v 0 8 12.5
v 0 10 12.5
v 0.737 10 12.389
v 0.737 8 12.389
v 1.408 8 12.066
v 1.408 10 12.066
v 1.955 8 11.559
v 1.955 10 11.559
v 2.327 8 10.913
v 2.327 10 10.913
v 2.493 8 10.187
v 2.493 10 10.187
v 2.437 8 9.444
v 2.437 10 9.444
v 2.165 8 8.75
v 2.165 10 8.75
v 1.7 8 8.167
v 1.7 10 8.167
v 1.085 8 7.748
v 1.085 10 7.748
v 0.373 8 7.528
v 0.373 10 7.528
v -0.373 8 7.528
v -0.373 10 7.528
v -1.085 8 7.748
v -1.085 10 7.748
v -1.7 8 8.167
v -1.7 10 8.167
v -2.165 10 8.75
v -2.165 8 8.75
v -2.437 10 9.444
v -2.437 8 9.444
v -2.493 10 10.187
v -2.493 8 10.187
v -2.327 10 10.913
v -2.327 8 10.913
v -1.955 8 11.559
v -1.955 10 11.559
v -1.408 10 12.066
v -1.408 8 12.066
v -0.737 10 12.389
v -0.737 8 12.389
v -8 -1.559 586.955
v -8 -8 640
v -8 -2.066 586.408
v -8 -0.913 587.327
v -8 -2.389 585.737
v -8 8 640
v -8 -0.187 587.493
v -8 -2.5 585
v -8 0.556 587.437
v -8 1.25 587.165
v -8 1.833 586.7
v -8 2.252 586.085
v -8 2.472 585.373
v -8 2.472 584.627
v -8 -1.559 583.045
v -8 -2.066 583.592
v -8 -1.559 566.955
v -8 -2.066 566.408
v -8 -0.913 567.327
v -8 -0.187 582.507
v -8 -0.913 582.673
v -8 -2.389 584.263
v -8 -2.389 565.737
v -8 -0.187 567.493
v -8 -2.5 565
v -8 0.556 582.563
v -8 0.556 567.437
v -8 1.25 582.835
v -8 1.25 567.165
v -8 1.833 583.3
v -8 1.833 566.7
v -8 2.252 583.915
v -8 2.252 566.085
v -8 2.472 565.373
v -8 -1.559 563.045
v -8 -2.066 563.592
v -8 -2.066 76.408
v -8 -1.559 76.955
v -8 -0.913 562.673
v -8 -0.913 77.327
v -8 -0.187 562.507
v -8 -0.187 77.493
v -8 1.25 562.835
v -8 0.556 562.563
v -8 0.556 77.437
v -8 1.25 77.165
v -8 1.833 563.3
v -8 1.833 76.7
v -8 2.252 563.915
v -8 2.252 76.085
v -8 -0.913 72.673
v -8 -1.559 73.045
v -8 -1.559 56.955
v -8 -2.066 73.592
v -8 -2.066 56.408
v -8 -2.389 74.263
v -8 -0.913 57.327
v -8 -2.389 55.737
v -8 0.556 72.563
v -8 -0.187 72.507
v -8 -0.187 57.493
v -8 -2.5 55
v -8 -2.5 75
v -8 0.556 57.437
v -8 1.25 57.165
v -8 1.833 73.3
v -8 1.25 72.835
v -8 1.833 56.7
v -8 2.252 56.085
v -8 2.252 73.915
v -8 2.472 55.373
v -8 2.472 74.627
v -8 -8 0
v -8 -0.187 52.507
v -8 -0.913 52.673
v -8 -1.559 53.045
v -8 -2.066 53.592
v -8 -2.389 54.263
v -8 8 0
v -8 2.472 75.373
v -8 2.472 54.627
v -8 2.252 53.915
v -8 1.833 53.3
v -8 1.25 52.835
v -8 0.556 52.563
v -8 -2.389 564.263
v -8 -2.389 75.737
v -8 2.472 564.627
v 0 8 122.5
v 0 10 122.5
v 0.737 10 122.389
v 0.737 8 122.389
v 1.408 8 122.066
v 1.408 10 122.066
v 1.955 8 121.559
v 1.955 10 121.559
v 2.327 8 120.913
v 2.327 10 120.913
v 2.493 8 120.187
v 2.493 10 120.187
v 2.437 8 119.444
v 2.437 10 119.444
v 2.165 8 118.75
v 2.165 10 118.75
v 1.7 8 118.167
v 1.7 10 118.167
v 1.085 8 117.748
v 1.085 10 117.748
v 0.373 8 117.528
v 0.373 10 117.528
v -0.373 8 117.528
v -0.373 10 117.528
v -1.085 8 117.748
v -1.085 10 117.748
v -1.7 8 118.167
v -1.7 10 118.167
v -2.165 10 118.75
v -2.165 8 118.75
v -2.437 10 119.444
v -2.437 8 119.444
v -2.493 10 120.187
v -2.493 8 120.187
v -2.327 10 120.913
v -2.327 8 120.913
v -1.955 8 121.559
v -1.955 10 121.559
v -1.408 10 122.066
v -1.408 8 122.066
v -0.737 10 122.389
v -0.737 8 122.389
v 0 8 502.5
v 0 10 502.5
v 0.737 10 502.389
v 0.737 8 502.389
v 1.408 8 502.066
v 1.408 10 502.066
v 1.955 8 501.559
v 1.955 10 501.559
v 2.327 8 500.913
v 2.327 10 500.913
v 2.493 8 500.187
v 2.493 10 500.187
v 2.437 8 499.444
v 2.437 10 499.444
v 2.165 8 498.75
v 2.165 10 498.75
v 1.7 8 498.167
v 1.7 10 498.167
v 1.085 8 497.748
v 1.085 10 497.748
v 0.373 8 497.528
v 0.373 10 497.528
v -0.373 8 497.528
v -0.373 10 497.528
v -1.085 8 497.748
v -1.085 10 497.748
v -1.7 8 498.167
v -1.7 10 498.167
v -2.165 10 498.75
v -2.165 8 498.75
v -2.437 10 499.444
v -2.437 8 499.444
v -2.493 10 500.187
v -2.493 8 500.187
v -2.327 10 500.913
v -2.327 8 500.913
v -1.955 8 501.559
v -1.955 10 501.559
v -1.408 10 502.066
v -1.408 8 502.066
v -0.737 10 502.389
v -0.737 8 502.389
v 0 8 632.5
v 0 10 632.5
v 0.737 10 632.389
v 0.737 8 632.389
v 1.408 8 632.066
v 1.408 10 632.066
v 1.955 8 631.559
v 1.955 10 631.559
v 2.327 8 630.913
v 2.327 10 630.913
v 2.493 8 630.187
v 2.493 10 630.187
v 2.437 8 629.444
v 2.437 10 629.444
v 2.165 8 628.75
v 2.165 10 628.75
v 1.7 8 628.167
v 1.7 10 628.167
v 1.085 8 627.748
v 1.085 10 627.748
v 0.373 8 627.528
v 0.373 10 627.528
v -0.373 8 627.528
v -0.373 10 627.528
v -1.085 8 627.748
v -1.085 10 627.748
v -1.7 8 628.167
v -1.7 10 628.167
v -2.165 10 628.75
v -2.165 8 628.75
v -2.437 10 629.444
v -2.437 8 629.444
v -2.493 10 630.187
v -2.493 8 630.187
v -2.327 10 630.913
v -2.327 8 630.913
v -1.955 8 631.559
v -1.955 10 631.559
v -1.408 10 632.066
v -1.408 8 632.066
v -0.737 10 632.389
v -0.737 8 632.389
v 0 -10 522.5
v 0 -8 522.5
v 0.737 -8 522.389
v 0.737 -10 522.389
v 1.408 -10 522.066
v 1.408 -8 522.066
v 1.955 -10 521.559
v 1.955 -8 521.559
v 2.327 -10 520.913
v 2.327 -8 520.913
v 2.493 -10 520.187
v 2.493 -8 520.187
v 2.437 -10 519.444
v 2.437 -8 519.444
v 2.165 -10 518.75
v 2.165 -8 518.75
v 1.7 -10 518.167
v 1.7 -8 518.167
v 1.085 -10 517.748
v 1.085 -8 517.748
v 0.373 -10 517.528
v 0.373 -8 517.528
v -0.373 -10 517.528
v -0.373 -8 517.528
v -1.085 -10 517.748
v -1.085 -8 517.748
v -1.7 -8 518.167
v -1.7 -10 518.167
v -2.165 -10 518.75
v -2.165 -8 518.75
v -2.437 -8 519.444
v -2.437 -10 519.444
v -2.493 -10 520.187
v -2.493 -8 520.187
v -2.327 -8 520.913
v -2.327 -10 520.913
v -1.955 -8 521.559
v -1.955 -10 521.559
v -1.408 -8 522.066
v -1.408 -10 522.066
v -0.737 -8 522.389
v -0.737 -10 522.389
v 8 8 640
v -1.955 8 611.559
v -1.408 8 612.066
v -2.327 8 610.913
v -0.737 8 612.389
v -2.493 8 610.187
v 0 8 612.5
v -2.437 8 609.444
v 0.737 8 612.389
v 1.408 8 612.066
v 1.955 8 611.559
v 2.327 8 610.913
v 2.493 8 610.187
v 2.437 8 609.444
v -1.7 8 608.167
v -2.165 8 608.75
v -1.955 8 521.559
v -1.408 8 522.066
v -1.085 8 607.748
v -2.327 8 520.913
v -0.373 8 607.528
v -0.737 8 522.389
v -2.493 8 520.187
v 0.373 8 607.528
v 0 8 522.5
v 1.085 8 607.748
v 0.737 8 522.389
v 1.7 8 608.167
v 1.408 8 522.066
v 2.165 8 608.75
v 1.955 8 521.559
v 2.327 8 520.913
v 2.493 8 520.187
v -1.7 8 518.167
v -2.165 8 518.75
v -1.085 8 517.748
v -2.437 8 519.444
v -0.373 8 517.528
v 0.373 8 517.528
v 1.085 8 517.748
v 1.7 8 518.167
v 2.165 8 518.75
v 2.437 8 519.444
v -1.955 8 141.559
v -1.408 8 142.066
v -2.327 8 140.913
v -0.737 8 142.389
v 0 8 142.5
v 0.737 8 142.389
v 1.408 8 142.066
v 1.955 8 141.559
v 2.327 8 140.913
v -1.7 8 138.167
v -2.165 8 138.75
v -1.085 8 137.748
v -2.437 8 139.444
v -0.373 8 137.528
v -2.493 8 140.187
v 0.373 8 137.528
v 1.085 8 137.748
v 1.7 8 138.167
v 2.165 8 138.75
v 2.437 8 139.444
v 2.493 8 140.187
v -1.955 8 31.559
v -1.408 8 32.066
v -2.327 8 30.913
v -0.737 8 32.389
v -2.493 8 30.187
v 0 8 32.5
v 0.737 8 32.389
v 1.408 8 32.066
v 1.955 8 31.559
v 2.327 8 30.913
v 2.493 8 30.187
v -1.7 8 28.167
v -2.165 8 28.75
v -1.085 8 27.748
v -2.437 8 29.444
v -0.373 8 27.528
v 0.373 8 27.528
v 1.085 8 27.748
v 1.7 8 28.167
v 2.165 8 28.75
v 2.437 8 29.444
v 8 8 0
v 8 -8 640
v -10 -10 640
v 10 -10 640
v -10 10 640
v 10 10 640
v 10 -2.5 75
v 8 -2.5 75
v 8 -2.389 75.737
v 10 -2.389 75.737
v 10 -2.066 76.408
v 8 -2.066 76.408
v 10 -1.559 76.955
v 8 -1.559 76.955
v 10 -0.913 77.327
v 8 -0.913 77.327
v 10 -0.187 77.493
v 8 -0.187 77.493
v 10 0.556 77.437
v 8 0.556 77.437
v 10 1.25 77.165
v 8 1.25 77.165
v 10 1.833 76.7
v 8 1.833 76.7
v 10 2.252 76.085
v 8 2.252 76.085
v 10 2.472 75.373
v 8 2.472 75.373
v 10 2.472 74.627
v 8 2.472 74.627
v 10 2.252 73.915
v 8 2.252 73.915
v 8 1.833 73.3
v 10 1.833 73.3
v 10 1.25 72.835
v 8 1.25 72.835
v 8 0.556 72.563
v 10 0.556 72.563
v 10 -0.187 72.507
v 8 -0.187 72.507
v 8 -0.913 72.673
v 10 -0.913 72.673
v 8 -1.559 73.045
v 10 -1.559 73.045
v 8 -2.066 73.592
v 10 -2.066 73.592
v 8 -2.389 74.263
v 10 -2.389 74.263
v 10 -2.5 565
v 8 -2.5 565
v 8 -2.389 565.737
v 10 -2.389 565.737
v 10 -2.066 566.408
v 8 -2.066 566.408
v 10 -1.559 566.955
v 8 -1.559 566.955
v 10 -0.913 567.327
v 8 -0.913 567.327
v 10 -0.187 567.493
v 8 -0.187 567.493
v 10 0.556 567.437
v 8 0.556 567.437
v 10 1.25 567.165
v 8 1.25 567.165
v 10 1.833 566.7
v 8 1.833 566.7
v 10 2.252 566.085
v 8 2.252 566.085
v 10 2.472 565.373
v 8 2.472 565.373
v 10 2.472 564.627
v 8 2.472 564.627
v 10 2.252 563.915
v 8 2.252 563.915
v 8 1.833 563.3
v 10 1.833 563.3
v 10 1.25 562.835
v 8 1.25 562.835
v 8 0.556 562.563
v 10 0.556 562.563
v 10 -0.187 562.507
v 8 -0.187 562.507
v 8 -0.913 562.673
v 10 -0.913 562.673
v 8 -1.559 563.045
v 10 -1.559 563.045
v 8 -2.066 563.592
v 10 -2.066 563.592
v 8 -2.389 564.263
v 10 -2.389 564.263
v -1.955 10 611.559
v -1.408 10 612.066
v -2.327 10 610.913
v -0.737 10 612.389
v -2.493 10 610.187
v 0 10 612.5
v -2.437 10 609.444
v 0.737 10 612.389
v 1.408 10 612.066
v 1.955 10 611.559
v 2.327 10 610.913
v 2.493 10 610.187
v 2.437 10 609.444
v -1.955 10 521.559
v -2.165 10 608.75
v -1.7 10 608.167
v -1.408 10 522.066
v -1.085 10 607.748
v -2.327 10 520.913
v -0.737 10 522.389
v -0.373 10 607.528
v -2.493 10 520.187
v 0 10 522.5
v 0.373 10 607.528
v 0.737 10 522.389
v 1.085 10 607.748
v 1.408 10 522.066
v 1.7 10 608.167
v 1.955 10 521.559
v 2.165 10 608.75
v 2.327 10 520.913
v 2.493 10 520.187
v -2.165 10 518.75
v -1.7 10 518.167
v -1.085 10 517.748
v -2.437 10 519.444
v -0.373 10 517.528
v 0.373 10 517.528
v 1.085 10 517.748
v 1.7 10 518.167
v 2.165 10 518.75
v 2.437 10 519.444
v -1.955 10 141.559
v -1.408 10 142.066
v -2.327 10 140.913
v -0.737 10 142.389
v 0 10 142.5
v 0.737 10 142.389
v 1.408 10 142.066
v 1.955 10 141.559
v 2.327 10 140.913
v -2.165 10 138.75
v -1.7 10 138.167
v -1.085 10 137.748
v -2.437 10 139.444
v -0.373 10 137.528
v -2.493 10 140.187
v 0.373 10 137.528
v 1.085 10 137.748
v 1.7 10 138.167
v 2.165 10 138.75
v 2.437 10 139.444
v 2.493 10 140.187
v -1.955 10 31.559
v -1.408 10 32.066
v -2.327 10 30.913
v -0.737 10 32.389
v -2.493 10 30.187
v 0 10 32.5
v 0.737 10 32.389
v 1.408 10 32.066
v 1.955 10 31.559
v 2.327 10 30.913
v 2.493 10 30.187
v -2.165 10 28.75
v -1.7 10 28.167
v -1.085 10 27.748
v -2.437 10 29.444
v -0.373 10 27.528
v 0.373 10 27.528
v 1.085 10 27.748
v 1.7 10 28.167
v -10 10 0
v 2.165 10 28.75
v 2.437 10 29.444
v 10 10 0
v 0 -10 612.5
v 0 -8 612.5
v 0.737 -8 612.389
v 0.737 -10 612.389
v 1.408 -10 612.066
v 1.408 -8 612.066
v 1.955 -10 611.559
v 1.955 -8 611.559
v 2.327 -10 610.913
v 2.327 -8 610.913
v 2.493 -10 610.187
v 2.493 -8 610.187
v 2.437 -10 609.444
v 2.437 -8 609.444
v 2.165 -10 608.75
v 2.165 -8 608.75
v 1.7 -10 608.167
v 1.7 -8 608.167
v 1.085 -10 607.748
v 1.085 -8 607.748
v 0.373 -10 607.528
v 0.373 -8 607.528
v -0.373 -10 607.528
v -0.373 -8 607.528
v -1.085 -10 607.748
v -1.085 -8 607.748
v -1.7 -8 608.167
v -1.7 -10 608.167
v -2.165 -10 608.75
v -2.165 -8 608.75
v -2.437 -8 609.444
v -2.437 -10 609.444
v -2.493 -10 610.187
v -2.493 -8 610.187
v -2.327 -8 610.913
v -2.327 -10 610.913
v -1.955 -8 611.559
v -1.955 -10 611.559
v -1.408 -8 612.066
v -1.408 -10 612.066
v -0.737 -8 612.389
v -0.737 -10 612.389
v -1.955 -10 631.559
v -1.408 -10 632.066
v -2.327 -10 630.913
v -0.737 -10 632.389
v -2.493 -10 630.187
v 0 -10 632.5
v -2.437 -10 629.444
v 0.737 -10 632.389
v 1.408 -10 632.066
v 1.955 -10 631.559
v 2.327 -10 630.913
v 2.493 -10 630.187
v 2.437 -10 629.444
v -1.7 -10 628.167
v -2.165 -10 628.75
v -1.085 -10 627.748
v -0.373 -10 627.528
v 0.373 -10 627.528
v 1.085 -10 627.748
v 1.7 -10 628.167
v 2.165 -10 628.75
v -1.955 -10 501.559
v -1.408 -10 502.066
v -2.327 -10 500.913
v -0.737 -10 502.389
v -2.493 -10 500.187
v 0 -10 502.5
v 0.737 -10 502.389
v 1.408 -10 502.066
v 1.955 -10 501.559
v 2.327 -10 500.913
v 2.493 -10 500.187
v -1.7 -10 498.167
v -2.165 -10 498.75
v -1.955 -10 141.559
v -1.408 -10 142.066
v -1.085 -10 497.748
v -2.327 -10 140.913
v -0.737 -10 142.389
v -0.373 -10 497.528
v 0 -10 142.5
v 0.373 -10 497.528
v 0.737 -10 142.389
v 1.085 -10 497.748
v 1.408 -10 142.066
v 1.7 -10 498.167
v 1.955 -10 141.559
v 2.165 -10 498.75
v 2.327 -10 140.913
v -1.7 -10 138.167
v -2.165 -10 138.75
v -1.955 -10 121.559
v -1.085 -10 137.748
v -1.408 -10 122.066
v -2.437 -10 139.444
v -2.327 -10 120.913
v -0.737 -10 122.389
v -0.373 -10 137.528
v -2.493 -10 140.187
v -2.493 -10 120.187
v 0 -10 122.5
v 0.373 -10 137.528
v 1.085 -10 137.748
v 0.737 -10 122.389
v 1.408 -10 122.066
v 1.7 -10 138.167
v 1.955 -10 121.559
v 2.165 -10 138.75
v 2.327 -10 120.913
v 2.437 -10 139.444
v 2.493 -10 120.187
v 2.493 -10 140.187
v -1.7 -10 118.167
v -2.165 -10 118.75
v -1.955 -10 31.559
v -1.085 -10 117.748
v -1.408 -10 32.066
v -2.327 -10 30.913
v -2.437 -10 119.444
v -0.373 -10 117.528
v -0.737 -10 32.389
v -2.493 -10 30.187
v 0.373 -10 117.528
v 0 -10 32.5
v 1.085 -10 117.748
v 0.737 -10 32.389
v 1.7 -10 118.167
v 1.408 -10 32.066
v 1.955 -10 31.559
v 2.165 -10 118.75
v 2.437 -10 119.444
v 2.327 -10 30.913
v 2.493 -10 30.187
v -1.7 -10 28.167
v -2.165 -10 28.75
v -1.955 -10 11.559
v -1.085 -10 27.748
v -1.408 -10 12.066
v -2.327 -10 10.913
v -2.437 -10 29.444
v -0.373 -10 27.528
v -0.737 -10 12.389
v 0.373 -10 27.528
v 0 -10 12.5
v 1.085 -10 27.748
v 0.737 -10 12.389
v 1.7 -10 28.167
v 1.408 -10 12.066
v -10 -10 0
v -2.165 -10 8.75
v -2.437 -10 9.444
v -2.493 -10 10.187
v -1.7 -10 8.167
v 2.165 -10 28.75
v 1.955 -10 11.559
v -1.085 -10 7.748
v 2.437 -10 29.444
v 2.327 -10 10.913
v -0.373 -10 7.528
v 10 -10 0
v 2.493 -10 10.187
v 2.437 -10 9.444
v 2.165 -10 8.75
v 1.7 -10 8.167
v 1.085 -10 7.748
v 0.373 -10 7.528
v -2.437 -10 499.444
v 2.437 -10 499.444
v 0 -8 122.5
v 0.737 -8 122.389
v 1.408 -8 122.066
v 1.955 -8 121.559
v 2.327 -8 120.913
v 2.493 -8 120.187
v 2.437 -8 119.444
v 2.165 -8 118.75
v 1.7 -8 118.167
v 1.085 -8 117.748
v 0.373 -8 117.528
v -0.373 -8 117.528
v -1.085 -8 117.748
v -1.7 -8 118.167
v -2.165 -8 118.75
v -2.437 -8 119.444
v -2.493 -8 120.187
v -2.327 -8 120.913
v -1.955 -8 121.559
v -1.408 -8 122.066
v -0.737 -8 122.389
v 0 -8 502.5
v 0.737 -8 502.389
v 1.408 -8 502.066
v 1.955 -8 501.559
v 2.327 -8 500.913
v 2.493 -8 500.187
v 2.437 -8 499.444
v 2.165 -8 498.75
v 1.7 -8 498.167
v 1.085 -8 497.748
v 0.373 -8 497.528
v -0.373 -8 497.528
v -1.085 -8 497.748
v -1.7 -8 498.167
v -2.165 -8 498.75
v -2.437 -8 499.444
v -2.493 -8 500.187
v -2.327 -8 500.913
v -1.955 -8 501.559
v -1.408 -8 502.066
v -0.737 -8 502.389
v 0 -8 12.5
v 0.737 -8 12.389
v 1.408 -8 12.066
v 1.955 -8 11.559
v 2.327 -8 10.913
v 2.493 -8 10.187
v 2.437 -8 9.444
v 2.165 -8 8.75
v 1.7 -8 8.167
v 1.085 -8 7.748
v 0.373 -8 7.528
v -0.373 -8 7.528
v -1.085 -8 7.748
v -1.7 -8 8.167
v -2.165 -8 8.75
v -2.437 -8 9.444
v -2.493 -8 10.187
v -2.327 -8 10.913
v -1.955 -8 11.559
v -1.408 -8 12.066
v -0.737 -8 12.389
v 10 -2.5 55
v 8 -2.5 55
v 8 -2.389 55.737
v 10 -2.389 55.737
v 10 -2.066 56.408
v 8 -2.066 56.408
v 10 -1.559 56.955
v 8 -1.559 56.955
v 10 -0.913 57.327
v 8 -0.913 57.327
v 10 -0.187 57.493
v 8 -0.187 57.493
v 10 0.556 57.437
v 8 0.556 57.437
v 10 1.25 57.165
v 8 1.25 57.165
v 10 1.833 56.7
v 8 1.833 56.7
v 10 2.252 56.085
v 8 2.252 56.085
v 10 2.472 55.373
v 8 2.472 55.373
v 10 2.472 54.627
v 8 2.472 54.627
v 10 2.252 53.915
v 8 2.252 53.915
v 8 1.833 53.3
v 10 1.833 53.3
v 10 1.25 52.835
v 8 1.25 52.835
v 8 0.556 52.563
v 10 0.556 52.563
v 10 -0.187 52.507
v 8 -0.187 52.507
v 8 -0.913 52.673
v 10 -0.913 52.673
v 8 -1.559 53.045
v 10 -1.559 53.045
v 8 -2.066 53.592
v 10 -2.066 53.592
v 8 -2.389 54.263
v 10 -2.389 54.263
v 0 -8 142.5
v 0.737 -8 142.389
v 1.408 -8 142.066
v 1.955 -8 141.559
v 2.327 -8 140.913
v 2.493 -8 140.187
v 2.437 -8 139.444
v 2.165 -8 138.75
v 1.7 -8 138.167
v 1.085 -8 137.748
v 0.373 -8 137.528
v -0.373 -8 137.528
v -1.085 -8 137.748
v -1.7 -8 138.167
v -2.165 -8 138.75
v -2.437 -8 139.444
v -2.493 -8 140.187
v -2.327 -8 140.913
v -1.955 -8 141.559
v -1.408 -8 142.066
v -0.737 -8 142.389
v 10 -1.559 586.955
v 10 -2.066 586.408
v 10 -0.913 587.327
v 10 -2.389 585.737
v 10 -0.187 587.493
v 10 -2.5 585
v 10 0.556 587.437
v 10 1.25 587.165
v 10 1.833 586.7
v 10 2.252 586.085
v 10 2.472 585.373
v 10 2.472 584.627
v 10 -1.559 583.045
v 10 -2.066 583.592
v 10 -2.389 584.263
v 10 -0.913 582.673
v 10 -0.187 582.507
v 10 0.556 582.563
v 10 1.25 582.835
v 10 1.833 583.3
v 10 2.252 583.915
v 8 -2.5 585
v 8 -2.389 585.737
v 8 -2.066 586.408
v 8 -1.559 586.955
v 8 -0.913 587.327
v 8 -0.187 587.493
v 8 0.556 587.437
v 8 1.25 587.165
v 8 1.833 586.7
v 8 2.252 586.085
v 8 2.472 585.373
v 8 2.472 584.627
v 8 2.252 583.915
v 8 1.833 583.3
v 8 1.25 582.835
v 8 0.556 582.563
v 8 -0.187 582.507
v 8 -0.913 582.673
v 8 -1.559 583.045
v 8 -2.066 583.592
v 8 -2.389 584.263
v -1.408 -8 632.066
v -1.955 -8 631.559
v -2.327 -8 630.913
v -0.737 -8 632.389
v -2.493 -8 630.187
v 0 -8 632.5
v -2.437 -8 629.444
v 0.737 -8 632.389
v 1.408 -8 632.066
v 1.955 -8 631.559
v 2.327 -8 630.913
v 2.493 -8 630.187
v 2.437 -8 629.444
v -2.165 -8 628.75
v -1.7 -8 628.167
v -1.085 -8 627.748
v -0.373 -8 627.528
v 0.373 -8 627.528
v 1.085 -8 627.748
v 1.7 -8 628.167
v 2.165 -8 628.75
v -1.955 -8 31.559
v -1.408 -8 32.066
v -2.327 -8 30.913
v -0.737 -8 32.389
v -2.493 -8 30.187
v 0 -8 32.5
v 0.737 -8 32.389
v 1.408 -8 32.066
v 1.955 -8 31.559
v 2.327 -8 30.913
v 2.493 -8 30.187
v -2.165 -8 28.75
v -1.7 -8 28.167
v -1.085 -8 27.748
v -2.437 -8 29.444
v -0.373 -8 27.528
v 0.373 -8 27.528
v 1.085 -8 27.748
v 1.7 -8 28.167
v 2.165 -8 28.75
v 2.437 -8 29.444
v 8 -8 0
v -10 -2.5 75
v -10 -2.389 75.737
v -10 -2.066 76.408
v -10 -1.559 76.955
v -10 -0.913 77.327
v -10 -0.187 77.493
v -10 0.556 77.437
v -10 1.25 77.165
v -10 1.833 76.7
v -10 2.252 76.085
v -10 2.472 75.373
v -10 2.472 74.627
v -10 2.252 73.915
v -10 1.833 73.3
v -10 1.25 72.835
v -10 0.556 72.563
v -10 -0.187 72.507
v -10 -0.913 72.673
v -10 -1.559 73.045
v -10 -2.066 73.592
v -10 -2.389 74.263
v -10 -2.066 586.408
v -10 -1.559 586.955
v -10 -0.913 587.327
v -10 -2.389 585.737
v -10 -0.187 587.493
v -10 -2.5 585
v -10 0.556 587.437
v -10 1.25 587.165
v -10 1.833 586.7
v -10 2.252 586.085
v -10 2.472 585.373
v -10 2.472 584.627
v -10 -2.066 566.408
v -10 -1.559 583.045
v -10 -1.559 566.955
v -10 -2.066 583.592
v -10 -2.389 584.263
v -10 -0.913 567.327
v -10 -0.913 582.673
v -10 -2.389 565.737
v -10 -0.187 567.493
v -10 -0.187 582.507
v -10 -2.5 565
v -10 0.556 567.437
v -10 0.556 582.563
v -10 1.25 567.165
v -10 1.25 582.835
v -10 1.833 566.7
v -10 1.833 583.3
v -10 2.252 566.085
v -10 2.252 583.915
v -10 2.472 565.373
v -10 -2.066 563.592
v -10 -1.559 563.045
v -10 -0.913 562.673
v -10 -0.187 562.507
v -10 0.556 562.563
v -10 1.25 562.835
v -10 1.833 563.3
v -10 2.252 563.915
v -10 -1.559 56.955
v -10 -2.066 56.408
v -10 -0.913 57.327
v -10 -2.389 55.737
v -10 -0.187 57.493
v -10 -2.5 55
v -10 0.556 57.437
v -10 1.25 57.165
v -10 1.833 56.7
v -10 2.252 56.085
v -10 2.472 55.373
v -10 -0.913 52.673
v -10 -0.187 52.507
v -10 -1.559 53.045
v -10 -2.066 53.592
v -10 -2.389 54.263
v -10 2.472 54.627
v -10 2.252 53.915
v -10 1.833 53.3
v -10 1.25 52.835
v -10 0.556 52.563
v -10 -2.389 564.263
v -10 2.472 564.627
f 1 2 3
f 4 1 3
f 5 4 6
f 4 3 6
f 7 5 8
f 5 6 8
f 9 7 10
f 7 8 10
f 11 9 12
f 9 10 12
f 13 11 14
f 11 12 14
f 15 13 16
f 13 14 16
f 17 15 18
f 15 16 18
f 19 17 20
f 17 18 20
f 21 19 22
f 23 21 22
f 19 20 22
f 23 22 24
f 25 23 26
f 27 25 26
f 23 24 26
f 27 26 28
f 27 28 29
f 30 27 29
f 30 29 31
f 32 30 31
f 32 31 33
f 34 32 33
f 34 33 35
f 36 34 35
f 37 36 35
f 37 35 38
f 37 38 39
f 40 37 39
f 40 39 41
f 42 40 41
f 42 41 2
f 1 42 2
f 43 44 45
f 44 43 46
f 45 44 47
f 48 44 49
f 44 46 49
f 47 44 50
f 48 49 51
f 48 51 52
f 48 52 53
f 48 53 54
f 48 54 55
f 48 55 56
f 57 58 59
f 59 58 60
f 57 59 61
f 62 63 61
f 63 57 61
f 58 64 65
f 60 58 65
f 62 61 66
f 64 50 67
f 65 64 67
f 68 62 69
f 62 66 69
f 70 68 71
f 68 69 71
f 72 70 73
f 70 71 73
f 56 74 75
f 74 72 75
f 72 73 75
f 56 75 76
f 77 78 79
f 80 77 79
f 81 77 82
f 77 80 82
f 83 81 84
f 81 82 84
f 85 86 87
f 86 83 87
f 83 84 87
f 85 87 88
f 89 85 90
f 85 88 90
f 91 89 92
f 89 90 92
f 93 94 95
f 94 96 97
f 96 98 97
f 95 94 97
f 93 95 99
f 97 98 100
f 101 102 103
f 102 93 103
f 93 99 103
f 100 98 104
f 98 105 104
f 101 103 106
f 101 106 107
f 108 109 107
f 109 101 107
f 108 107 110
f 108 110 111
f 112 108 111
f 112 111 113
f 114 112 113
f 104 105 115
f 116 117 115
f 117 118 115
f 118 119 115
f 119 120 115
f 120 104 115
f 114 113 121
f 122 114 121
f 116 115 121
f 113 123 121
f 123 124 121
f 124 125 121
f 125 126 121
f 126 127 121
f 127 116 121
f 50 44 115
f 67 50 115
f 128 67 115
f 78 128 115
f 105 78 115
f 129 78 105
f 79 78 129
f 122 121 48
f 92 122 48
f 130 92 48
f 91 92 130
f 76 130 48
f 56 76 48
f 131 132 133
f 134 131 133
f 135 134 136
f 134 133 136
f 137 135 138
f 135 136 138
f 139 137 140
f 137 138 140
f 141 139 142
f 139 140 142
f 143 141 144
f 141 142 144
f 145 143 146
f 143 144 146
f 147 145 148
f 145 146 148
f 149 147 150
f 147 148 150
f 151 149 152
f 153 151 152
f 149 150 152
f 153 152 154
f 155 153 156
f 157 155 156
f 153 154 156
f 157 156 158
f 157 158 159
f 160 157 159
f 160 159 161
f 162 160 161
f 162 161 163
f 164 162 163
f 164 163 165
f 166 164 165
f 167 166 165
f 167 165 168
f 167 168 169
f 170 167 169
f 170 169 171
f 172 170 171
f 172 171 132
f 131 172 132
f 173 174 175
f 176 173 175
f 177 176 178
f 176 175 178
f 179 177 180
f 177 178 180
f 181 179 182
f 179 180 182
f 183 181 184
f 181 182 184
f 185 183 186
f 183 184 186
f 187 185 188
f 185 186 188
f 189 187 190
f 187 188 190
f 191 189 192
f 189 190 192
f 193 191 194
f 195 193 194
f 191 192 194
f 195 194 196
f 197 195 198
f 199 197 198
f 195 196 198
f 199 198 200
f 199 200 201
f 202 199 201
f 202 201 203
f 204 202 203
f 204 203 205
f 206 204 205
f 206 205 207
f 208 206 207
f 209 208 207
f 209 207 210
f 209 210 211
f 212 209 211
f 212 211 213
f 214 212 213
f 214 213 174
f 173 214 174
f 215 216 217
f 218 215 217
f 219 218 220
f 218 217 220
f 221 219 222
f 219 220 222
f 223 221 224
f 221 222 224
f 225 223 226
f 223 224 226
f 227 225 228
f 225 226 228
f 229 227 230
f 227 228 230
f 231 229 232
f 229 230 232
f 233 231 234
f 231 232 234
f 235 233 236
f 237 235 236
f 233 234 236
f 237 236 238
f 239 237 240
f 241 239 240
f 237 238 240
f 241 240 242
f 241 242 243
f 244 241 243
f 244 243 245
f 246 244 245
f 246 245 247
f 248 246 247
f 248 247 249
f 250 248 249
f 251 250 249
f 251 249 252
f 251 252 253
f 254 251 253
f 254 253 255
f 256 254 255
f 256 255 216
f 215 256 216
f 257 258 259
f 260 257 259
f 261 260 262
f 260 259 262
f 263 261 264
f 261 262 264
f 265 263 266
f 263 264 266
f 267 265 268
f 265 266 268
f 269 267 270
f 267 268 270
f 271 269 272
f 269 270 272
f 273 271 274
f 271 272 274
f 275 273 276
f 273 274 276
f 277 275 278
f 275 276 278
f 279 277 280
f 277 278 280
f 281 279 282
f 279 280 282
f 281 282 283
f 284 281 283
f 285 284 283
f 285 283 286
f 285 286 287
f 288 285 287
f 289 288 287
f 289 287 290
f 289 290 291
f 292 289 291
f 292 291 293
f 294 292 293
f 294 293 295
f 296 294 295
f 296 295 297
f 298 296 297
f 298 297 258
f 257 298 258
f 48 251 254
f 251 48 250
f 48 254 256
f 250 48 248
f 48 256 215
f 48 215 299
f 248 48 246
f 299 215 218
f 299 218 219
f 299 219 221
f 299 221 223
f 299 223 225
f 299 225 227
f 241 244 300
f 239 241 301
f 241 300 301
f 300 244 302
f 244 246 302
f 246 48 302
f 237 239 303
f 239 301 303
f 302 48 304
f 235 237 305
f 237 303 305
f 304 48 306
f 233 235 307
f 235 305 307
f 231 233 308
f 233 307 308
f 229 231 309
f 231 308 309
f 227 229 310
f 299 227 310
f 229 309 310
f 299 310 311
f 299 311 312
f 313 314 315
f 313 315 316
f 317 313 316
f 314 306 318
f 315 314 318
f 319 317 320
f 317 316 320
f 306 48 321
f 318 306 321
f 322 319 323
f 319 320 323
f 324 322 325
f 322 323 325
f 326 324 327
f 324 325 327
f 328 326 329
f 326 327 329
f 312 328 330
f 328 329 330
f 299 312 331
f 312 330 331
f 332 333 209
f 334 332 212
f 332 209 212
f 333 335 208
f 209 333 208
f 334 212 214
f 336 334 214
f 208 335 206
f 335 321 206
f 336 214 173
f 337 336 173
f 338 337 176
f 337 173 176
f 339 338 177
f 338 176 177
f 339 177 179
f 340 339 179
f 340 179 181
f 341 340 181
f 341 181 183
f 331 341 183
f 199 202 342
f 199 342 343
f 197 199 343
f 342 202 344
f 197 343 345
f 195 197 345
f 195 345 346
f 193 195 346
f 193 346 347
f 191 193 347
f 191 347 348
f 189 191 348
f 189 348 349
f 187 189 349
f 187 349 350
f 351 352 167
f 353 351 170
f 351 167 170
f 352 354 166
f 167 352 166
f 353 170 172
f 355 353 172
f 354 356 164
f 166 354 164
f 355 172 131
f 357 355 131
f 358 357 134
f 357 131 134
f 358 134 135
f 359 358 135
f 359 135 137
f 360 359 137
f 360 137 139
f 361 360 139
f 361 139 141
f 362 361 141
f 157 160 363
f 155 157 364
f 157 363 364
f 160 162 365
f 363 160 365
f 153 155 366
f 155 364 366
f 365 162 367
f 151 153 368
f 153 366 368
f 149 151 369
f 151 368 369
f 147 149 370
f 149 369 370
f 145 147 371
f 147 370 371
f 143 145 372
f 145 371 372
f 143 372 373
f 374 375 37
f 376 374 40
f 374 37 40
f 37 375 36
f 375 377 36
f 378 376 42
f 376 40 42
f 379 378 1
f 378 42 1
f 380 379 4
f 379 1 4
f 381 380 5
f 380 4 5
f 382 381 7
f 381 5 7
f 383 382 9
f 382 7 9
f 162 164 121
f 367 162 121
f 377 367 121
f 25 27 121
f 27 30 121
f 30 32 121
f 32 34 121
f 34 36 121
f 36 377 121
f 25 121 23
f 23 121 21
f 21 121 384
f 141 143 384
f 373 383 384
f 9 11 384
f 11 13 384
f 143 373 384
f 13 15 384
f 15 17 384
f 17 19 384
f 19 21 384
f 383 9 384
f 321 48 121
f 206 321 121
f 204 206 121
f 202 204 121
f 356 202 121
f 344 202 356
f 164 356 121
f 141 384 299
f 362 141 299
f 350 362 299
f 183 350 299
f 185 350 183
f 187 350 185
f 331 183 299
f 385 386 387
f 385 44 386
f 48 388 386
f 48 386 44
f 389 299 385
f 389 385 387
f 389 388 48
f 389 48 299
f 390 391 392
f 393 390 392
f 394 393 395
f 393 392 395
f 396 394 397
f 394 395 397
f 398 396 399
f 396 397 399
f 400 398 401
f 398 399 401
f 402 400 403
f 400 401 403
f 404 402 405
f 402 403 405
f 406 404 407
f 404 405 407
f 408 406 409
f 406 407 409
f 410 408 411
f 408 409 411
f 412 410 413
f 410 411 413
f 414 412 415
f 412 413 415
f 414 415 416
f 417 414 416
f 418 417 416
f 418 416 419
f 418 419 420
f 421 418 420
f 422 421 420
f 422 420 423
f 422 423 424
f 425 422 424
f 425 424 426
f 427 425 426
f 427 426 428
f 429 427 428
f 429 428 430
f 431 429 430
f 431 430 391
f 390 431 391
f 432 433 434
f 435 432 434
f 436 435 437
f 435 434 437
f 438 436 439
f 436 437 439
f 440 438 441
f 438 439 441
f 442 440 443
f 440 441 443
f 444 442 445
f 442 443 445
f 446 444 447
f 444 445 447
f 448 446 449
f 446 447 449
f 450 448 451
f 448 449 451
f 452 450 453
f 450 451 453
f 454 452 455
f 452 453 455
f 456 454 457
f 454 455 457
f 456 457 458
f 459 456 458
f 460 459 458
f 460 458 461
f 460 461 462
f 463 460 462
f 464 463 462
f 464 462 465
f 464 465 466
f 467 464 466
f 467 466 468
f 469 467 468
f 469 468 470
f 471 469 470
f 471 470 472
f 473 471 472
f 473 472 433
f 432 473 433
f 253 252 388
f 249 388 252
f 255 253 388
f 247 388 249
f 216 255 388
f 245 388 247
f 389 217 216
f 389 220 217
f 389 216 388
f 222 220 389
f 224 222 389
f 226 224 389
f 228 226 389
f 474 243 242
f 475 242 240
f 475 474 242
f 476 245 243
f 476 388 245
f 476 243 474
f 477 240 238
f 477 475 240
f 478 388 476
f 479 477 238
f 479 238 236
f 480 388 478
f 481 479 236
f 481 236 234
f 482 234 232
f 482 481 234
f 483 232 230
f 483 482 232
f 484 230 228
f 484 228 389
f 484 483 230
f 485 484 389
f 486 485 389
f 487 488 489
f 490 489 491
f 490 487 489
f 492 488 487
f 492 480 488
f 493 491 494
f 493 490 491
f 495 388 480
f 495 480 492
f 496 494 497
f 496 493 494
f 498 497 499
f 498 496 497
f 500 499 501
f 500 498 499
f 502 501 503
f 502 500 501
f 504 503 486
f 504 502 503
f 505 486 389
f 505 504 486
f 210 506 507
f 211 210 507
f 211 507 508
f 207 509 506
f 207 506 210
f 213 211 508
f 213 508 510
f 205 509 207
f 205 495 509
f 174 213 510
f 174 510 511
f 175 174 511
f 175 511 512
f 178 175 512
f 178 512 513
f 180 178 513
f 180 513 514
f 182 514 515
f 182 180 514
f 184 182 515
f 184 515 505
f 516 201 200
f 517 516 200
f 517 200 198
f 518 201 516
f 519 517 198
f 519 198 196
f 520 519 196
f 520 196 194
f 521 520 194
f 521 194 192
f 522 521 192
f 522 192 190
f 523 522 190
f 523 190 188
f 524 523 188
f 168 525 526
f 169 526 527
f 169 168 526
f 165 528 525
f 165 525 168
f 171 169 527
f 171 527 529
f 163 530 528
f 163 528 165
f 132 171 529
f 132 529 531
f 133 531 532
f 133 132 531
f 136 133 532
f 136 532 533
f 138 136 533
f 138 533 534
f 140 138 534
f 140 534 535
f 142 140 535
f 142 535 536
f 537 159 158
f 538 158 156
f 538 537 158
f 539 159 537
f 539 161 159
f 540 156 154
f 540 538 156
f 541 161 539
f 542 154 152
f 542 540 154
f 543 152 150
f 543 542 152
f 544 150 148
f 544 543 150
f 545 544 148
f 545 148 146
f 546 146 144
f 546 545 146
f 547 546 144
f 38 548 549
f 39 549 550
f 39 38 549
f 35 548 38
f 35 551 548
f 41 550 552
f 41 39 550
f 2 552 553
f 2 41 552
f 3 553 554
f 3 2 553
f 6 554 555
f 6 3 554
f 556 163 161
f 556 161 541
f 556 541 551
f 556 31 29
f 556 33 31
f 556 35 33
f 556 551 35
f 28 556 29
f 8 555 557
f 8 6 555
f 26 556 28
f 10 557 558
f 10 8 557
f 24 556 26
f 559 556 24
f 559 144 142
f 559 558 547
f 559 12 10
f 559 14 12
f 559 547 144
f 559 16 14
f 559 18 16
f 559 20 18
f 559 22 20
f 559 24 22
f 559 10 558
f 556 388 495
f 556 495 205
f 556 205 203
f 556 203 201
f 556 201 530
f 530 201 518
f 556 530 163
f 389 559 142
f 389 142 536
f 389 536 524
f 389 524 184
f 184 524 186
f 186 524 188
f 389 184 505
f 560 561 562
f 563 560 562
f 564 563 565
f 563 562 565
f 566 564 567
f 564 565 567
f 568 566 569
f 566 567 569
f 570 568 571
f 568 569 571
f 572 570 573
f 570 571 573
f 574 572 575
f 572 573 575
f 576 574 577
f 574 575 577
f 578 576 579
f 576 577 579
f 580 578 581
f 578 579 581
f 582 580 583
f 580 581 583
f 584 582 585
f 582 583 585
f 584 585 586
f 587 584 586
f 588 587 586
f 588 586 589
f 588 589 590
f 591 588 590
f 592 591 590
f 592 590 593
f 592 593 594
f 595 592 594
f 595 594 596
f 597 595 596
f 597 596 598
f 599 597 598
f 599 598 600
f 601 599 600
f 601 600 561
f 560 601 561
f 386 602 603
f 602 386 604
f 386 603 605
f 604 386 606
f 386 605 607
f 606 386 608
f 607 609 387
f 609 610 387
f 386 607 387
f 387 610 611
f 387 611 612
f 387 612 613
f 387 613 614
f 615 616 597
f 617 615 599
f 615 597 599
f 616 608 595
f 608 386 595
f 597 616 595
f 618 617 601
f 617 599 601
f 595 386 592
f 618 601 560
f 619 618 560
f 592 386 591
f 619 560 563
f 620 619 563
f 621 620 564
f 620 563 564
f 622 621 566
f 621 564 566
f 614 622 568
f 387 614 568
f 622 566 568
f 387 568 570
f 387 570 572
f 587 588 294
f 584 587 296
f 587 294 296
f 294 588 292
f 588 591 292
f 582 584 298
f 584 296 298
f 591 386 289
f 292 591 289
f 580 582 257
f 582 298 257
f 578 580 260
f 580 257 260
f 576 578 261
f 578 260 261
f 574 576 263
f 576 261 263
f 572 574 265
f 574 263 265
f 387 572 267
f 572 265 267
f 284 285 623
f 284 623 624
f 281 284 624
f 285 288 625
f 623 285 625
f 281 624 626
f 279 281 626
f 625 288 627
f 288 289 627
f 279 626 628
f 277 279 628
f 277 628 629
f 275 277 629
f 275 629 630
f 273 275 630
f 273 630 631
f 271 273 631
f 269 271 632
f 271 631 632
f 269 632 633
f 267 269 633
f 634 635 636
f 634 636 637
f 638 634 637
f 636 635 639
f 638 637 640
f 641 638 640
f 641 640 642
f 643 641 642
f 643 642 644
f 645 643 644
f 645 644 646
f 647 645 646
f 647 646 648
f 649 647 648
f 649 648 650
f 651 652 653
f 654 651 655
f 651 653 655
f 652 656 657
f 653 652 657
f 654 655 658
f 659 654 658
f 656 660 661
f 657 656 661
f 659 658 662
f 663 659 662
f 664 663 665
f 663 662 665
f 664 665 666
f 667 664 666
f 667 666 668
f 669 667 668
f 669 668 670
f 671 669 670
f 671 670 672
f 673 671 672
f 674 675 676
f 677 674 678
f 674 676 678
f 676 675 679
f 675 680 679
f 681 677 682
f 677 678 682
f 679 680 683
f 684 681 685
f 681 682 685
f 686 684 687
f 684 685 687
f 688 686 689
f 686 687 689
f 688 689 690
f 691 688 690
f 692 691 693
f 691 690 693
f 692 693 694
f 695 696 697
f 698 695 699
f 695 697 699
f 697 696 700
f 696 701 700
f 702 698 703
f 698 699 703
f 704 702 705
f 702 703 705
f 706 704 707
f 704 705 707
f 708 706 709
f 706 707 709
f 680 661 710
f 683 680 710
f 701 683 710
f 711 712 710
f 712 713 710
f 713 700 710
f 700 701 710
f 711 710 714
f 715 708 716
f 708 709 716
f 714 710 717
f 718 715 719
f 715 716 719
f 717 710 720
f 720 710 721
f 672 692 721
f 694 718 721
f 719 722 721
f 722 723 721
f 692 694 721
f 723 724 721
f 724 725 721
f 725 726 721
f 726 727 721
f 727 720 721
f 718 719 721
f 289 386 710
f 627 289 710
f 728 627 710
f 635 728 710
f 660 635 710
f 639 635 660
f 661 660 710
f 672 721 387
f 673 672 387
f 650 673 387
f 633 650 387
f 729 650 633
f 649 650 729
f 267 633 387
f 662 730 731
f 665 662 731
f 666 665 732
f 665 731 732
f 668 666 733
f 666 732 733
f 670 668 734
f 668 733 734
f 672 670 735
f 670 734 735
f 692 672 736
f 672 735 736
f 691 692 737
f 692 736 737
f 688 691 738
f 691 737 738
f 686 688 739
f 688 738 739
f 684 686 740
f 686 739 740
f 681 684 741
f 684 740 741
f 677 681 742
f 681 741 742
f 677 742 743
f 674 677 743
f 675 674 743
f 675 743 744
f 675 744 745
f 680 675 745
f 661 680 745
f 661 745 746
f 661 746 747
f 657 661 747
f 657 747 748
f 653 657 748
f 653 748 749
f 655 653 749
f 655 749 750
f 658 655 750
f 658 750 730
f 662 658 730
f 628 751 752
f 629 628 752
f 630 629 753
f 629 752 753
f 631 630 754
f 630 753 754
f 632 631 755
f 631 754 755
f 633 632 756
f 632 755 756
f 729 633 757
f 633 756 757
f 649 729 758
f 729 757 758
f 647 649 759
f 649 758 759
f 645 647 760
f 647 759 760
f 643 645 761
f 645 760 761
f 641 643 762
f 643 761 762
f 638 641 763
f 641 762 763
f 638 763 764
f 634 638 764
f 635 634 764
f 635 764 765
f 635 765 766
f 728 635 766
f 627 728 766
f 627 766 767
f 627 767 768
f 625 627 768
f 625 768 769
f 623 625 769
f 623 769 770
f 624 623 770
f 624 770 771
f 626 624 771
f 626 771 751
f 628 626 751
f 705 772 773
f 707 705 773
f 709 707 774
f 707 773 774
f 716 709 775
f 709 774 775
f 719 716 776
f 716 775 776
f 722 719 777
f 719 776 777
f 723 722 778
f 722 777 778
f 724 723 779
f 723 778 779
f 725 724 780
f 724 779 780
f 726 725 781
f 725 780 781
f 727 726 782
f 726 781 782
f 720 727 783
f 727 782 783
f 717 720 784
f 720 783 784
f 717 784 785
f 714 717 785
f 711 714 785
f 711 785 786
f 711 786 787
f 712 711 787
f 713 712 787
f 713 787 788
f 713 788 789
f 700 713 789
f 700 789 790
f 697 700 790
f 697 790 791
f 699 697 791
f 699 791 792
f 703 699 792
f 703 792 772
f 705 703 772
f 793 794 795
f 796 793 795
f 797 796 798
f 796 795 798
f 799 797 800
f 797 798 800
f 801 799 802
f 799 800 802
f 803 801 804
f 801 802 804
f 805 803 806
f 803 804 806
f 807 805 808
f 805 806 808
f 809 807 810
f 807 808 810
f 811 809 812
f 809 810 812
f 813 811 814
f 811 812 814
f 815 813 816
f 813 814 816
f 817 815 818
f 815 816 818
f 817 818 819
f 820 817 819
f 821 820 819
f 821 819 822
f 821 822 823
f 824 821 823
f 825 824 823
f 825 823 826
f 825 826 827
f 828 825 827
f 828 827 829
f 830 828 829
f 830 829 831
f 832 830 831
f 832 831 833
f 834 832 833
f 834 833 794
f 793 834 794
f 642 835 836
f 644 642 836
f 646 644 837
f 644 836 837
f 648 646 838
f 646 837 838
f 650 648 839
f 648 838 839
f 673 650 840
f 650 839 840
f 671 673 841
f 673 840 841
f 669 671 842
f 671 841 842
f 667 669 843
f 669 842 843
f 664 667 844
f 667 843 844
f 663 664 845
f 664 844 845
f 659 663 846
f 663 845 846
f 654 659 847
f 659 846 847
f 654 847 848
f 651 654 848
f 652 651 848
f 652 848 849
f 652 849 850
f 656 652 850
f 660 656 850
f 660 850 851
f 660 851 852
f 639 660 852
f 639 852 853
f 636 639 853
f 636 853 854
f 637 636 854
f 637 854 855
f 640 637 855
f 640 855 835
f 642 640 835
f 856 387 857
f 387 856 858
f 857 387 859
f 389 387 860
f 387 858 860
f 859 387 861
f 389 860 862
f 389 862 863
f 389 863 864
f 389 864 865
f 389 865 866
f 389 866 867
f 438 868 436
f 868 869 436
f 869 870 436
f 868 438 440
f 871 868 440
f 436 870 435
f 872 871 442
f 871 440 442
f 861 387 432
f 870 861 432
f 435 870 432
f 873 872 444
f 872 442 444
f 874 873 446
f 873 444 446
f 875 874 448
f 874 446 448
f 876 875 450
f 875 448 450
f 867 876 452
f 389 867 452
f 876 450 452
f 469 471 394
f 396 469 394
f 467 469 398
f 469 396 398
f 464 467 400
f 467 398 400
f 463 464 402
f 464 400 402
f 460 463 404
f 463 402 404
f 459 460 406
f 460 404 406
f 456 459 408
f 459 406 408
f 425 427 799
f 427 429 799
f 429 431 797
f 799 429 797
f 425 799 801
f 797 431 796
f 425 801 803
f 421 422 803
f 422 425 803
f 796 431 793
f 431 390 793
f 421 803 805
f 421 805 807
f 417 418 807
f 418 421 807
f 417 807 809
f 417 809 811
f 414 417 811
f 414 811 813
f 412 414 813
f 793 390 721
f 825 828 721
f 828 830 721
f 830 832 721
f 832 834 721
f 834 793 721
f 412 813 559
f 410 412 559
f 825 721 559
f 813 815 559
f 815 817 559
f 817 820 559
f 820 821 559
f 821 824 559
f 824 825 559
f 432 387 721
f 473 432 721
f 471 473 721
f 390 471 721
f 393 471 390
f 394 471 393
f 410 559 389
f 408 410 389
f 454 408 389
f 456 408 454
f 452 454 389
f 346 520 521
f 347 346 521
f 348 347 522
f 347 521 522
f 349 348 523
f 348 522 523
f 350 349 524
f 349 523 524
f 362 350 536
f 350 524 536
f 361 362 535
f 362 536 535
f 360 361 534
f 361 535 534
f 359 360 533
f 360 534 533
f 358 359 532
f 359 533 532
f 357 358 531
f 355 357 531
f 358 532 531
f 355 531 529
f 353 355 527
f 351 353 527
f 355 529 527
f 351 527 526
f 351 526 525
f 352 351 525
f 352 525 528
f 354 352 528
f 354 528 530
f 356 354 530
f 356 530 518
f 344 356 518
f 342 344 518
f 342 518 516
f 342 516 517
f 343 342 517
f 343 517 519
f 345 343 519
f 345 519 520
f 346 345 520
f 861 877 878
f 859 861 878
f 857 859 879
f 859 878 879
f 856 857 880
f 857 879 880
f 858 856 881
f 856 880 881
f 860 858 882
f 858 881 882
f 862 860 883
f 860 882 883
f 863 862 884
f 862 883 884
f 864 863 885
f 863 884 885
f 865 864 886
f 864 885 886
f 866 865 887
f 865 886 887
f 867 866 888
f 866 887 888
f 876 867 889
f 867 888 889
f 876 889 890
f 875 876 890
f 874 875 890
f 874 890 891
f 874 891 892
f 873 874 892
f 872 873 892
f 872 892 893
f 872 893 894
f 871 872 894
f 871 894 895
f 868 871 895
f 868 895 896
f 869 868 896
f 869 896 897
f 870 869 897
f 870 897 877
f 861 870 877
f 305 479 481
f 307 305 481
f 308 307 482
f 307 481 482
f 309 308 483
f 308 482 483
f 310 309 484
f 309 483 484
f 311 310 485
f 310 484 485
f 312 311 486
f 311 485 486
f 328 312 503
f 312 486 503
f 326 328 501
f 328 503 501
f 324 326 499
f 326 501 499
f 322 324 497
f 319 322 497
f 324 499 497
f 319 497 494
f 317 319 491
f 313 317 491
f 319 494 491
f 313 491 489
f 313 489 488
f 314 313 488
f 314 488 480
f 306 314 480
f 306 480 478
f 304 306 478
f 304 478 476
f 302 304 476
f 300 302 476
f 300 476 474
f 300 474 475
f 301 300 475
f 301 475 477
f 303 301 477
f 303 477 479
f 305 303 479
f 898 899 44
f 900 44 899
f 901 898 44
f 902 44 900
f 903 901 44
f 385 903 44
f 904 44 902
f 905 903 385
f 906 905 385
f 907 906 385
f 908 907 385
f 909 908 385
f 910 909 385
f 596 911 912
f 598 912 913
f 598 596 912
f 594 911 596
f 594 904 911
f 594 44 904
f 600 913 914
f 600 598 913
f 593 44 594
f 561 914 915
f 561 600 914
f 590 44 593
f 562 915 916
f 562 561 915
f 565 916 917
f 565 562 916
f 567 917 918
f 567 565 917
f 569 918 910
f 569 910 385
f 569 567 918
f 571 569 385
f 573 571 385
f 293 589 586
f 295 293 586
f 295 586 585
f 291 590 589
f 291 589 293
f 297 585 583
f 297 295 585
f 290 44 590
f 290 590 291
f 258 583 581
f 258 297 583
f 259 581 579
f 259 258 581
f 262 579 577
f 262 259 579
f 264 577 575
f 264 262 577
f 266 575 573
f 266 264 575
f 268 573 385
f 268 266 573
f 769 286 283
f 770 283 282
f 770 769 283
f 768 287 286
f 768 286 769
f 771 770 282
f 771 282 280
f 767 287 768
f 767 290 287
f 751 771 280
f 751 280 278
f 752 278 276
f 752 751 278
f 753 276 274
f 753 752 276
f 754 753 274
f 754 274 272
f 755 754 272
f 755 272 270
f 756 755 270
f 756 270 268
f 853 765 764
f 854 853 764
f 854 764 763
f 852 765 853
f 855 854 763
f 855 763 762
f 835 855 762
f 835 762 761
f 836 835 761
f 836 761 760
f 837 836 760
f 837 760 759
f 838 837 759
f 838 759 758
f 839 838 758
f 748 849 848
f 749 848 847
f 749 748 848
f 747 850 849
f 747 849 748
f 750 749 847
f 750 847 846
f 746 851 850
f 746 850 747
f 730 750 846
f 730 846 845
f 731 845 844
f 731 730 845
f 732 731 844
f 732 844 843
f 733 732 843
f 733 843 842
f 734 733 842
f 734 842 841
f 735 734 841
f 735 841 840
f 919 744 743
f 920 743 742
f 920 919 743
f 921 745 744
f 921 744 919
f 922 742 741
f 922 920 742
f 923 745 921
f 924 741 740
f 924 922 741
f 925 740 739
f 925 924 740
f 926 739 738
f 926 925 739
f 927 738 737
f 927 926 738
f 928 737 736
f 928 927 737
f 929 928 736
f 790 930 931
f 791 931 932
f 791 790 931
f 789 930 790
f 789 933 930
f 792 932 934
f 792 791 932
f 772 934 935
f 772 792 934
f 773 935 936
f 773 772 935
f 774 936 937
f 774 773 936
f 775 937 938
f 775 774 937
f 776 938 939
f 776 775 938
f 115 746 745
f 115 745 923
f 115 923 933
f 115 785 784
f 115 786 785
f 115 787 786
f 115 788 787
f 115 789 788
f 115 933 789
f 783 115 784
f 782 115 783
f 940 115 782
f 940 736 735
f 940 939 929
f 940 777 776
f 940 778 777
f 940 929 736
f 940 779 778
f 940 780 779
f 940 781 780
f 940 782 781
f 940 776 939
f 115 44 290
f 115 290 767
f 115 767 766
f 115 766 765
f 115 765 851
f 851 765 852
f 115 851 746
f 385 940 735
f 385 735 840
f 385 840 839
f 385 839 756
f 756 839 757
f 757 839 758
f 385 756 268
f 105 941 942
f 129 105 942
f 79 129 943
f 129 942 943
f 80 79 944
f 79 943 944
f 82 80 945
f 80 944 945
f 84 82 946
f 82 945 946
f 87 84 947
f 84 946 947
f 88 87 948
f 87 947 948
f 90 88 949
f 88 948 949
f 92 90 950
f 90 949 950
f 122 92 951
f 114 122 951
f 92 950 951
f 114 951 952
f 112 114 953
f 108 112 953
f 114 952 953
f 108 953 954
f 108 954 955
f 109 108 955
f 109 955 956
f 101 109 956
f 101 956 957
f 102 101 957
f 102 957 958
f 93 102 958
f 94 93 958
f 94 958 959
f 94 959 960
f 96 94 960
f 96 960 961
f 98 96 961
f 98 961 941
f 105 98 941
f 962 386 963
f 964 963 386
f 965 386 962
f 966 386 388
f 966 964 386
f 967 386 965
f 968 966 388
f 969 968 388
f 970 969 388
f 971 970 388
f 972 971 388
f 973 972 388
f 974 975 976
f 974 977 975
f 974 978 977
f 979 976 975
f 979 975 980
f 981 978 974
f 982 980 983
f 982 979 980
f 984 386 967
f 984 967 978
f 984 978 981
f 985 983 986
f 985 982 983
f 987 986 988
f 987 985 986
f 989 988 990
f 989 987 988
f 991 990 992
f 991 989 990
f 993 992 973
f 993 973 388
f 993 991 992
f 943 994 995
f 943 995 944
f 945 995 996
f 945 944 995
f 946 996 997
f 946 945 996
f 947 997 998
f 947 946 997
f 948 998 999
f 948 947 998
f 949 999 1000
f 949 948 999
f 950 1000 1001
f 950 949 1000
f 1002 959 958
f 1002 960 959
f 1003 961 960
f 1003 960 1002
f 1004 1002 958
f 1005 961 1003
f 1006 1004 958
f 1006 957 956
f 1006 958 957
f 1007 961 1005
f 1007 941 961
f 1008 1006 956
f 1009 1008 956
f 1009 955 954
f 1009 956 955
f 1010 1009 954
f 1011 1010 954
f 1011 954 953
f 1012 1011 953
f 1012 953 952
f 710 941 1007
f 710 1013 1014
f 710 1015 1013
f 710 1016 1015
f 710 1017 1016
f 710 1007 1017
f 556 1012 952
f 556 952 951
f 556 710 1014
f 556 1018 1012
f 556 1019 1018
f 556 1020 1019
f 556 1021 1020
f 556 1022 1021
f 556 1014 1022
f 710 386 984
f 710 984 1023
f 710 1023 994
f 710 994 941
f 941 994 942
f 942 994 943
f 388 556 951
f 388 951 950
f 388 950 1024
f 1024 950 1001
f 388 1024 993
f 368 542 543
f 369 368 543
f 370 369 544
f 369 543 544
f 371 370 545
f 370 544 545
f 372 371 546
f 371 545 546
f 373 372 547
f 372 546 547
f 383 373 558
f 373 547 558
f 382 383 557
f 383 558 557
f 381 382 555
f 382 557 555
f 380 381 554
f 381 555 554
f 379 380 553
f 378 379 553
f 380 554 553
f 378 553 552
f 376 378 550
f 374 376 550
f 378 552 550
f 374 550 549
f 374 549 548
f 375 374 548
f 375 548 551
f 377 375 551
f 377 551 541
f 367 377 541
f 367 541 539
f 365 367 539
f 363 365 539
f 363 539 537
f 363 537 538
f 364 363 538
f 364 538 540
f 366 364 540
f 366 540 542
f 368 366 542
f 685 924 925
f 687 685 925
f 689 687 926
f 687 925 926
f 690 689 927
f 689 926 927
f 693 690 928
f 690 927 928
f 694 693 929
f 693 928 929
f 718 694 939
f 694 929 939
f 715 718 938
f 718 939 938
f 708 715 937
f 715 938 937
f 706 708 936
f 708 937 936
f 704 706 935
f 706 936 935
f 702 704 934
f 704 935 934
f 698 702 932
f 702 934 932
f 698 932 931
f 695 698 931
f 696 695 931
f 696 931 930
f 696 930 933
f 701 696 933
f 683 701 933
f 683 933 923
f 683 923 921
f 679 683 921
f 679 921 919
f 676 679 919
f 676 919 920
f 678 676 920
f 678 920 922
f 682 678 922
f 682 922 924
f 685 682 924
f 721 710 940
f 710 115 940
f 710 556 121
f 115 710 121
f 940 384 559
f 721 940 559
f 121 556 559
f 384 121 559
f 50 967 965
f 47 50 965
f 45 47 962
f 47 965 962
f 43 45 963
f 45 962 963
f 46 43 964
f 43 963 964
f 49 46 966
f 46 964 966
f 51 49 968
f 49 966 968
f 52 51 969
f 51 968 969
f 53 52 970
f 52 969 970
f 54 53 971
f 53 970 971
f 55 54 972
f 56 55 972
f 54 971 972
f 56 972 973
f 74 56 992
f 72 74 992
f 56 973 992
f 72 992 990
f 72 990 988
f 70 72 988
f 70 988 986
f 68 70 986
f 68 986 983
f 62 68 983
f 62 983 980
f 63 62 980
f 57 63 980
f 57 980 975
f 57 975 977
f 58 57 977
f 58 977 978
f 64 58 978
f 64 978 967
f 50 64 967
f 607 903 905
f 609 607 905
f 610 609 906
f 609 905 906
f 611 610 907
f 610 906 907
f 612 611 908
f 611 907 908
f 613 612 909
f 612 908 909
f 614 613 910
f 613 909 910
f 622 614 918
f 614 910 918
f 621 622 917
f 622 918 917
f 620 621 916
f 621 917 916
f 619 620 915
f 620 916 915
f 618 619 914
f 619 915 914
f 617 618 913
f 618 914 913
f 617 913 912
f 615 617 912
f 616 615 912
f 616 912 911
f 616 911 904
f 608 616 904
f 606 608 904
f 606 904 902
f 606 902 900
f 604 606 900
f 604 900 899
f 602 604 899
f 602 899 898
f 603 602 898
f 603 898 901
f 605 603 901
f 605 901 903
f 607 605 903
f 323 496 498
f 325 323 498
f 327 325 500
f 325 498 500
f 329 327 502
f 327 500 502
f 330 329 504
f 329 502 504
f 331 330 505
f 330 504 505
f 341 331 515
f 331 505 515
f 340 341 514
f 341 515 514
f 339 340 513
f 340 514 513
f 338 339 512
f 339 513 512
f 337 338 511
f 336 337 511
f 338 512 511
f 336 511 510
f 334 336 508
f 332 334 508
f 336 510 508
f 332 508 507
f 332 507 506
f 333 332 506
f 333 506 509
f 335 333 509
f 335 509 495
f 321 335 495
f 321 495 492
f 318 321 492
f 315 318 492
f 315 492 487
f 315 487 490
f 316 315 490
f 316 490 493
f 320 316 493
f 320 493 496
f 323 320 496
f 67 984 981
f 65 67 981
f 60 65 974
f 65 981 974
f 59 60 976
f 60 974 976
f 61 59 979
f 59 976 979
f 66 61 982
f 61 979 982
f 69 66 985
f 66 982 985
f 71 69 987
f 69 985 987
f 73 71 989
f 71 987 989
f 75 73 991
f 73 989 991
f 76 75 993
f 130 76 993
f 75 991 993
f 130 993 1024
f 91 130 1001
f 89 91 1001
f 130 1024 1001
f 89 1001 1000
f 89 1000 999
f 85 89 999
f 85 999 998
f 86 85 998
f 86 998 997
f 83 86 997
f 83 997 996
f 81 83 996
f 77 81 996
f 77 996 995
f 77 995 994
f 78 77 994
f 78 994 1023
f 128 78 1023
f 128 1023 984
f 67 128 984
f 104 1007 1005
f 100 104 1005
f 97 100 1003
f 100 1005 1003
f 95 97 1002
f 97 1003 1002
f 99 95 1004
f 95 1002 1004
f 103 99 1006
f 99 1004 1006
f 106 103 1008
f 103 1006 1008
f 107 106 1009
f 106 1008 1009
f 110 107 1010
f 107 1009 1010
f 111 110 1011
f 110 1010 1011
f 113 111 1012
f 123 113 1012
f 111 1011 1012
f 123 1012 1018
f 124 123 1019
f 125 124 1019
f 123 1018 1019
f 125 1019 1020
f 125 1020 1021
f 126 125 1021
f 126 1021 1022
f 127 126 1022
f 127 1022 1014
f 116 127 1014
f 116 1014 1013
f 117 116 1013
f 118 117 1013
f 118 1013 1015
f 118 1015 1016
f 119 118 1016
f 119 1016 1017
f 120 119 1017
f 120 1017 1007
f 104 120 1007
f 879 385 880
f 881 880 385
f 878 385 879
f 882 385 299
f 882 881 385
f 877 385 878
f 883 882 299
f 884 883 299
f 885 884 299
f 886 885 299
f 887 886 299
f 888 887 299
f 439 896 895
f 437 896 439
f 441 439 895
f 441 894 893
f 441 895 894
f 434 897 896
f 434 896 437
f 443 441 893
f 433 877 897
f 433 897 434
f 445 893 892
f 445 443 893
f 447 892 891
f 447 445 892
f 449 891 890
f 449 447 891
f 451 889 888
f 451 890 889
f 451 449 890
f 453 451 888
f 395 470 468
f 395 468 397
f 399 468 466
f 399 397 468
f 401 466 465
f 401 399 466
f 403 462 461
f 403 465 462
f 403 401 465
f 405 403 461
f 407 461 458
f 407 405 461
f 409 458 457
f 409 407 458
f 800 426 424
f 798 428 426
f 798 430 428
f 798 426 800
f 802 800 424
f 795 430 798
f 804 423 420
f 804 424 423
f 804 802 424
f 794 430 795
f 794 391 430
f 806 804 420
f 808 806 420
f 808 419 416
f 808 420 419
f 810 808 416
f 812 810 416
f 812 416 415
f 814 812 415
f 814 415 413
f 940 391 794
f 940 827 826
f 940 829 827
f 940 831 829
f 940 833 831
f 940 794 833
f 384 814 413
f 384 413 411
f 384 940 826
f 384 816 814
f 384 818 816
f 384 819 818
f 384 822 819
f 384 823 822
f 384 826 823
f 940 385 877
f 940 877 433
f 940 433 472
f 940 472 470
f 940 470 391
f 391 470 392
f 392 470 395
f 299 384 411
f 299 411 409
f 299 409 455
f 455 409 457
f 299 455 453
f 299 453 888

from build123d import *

# Parameters (mm, degrees)
SKETCH1_W           = 20
SKETCH1_H           = 20
SKETCH1_W_2         = 16
SKETCH1_H_2         = 16
BOSS_EXTRUDE1_DEPTH = 640
SKETCH2_R           = 2.5
CUT_EXTRUDE1_DEPTH  = 641.390505863
SKETCH3_R           = 2.5
CUT_EXTRUDE2_DEPTH  = 641.390505863
SKETCH4_R           = 2.5
CUT_EXTRUDE3_DEPTH  = 641.390505863


with BuildPart() as part:
    # Sketch1 → Boss-Extrude1 (new body)
    with BuildSketch(Plane.XY):
        Rectangle(SKETCH1_W, SKETCH1_H)
        Rectangle(SKETCH1_W_2, SKETCH1_H_2, mode=Mode.SUBTRACT)
    extrude(amount=BOSS_EXTRUDE1_DEPTH)

    # Sketch2 → Cut-Extrude1 (cut, through all)
    with BuildSketch(Plane(origin=(0, 10, 0), x_dir=(1, 0, 0), z_dir=(0, 1, 0))):
        with Locations(Location((0, -10, 0), (0, 0, 270))):
            Circle(SKETCH2_R)
        with Locations(Location((0, -630, 0), (0, 0, 270))):
            Circle(SKETCH2_R)
        with Locations(Location((0, -30, 0), (0, 0, 270))):
            Circle(SKETCH2_R)
        with Locations(Location((0, -610, 0), (0, 0, 270))):
            Circle(SKETCH2_R)
    extrude(amount=-CUT_EXTRUDE1_DEPTH, mode=Mode.SUBTRACT)

    # Sketch3 → Cut-Extrude2 (cut, through all)
    with BuildSketch(Plane(origin=(0, 10, 0), x_dir=(1, 0, 0), z_dir=(0, 1, 0))):
        with Locations(Location((0, -140, 0), (0, 0, 270))):
            Circle(SKETCH3_R)
        with Locations(Location((0, -500, 0), (0, 0, 270))):
            Circle(SKETCH3_R)
        with Locations(Location((0, -120, 0), (0, 0, 270))):
            Circle(SKETCH3_R)
        with Locations(Location((0, -520, 0), (0, 0, 270))):
            Circle(SKETCH3_R)
    extrude(amount=-CUT_EXTRUDE2_DEPTH, mode=Mode.SUBTRACT)

    # Sketch4 → Cut-Extrude3 (cut, through all)
    with BuildSketch(Plane.ZY.offset(10)):
        with Locations(Location((55, 0, 0), (0, 0, 270))):
            Circle(SKETCH4_R)
        with Locations(Location((75, 0, 0), (0, 0, 270))):
            Circle(SKETCH4_R)
        with Locations(Location((565, 0, 0), (0, 0, 270))):
            Circle(SKETCH4_R)
        with Locations(Location((585, 0, 0), (0, 0, 270))):
            Circle(SKETCH4_R)
    extrude(amount=-CUT_EXTRUDE3_DEPTH, mode=Mode.SUBTRACT)


solid = part.part
